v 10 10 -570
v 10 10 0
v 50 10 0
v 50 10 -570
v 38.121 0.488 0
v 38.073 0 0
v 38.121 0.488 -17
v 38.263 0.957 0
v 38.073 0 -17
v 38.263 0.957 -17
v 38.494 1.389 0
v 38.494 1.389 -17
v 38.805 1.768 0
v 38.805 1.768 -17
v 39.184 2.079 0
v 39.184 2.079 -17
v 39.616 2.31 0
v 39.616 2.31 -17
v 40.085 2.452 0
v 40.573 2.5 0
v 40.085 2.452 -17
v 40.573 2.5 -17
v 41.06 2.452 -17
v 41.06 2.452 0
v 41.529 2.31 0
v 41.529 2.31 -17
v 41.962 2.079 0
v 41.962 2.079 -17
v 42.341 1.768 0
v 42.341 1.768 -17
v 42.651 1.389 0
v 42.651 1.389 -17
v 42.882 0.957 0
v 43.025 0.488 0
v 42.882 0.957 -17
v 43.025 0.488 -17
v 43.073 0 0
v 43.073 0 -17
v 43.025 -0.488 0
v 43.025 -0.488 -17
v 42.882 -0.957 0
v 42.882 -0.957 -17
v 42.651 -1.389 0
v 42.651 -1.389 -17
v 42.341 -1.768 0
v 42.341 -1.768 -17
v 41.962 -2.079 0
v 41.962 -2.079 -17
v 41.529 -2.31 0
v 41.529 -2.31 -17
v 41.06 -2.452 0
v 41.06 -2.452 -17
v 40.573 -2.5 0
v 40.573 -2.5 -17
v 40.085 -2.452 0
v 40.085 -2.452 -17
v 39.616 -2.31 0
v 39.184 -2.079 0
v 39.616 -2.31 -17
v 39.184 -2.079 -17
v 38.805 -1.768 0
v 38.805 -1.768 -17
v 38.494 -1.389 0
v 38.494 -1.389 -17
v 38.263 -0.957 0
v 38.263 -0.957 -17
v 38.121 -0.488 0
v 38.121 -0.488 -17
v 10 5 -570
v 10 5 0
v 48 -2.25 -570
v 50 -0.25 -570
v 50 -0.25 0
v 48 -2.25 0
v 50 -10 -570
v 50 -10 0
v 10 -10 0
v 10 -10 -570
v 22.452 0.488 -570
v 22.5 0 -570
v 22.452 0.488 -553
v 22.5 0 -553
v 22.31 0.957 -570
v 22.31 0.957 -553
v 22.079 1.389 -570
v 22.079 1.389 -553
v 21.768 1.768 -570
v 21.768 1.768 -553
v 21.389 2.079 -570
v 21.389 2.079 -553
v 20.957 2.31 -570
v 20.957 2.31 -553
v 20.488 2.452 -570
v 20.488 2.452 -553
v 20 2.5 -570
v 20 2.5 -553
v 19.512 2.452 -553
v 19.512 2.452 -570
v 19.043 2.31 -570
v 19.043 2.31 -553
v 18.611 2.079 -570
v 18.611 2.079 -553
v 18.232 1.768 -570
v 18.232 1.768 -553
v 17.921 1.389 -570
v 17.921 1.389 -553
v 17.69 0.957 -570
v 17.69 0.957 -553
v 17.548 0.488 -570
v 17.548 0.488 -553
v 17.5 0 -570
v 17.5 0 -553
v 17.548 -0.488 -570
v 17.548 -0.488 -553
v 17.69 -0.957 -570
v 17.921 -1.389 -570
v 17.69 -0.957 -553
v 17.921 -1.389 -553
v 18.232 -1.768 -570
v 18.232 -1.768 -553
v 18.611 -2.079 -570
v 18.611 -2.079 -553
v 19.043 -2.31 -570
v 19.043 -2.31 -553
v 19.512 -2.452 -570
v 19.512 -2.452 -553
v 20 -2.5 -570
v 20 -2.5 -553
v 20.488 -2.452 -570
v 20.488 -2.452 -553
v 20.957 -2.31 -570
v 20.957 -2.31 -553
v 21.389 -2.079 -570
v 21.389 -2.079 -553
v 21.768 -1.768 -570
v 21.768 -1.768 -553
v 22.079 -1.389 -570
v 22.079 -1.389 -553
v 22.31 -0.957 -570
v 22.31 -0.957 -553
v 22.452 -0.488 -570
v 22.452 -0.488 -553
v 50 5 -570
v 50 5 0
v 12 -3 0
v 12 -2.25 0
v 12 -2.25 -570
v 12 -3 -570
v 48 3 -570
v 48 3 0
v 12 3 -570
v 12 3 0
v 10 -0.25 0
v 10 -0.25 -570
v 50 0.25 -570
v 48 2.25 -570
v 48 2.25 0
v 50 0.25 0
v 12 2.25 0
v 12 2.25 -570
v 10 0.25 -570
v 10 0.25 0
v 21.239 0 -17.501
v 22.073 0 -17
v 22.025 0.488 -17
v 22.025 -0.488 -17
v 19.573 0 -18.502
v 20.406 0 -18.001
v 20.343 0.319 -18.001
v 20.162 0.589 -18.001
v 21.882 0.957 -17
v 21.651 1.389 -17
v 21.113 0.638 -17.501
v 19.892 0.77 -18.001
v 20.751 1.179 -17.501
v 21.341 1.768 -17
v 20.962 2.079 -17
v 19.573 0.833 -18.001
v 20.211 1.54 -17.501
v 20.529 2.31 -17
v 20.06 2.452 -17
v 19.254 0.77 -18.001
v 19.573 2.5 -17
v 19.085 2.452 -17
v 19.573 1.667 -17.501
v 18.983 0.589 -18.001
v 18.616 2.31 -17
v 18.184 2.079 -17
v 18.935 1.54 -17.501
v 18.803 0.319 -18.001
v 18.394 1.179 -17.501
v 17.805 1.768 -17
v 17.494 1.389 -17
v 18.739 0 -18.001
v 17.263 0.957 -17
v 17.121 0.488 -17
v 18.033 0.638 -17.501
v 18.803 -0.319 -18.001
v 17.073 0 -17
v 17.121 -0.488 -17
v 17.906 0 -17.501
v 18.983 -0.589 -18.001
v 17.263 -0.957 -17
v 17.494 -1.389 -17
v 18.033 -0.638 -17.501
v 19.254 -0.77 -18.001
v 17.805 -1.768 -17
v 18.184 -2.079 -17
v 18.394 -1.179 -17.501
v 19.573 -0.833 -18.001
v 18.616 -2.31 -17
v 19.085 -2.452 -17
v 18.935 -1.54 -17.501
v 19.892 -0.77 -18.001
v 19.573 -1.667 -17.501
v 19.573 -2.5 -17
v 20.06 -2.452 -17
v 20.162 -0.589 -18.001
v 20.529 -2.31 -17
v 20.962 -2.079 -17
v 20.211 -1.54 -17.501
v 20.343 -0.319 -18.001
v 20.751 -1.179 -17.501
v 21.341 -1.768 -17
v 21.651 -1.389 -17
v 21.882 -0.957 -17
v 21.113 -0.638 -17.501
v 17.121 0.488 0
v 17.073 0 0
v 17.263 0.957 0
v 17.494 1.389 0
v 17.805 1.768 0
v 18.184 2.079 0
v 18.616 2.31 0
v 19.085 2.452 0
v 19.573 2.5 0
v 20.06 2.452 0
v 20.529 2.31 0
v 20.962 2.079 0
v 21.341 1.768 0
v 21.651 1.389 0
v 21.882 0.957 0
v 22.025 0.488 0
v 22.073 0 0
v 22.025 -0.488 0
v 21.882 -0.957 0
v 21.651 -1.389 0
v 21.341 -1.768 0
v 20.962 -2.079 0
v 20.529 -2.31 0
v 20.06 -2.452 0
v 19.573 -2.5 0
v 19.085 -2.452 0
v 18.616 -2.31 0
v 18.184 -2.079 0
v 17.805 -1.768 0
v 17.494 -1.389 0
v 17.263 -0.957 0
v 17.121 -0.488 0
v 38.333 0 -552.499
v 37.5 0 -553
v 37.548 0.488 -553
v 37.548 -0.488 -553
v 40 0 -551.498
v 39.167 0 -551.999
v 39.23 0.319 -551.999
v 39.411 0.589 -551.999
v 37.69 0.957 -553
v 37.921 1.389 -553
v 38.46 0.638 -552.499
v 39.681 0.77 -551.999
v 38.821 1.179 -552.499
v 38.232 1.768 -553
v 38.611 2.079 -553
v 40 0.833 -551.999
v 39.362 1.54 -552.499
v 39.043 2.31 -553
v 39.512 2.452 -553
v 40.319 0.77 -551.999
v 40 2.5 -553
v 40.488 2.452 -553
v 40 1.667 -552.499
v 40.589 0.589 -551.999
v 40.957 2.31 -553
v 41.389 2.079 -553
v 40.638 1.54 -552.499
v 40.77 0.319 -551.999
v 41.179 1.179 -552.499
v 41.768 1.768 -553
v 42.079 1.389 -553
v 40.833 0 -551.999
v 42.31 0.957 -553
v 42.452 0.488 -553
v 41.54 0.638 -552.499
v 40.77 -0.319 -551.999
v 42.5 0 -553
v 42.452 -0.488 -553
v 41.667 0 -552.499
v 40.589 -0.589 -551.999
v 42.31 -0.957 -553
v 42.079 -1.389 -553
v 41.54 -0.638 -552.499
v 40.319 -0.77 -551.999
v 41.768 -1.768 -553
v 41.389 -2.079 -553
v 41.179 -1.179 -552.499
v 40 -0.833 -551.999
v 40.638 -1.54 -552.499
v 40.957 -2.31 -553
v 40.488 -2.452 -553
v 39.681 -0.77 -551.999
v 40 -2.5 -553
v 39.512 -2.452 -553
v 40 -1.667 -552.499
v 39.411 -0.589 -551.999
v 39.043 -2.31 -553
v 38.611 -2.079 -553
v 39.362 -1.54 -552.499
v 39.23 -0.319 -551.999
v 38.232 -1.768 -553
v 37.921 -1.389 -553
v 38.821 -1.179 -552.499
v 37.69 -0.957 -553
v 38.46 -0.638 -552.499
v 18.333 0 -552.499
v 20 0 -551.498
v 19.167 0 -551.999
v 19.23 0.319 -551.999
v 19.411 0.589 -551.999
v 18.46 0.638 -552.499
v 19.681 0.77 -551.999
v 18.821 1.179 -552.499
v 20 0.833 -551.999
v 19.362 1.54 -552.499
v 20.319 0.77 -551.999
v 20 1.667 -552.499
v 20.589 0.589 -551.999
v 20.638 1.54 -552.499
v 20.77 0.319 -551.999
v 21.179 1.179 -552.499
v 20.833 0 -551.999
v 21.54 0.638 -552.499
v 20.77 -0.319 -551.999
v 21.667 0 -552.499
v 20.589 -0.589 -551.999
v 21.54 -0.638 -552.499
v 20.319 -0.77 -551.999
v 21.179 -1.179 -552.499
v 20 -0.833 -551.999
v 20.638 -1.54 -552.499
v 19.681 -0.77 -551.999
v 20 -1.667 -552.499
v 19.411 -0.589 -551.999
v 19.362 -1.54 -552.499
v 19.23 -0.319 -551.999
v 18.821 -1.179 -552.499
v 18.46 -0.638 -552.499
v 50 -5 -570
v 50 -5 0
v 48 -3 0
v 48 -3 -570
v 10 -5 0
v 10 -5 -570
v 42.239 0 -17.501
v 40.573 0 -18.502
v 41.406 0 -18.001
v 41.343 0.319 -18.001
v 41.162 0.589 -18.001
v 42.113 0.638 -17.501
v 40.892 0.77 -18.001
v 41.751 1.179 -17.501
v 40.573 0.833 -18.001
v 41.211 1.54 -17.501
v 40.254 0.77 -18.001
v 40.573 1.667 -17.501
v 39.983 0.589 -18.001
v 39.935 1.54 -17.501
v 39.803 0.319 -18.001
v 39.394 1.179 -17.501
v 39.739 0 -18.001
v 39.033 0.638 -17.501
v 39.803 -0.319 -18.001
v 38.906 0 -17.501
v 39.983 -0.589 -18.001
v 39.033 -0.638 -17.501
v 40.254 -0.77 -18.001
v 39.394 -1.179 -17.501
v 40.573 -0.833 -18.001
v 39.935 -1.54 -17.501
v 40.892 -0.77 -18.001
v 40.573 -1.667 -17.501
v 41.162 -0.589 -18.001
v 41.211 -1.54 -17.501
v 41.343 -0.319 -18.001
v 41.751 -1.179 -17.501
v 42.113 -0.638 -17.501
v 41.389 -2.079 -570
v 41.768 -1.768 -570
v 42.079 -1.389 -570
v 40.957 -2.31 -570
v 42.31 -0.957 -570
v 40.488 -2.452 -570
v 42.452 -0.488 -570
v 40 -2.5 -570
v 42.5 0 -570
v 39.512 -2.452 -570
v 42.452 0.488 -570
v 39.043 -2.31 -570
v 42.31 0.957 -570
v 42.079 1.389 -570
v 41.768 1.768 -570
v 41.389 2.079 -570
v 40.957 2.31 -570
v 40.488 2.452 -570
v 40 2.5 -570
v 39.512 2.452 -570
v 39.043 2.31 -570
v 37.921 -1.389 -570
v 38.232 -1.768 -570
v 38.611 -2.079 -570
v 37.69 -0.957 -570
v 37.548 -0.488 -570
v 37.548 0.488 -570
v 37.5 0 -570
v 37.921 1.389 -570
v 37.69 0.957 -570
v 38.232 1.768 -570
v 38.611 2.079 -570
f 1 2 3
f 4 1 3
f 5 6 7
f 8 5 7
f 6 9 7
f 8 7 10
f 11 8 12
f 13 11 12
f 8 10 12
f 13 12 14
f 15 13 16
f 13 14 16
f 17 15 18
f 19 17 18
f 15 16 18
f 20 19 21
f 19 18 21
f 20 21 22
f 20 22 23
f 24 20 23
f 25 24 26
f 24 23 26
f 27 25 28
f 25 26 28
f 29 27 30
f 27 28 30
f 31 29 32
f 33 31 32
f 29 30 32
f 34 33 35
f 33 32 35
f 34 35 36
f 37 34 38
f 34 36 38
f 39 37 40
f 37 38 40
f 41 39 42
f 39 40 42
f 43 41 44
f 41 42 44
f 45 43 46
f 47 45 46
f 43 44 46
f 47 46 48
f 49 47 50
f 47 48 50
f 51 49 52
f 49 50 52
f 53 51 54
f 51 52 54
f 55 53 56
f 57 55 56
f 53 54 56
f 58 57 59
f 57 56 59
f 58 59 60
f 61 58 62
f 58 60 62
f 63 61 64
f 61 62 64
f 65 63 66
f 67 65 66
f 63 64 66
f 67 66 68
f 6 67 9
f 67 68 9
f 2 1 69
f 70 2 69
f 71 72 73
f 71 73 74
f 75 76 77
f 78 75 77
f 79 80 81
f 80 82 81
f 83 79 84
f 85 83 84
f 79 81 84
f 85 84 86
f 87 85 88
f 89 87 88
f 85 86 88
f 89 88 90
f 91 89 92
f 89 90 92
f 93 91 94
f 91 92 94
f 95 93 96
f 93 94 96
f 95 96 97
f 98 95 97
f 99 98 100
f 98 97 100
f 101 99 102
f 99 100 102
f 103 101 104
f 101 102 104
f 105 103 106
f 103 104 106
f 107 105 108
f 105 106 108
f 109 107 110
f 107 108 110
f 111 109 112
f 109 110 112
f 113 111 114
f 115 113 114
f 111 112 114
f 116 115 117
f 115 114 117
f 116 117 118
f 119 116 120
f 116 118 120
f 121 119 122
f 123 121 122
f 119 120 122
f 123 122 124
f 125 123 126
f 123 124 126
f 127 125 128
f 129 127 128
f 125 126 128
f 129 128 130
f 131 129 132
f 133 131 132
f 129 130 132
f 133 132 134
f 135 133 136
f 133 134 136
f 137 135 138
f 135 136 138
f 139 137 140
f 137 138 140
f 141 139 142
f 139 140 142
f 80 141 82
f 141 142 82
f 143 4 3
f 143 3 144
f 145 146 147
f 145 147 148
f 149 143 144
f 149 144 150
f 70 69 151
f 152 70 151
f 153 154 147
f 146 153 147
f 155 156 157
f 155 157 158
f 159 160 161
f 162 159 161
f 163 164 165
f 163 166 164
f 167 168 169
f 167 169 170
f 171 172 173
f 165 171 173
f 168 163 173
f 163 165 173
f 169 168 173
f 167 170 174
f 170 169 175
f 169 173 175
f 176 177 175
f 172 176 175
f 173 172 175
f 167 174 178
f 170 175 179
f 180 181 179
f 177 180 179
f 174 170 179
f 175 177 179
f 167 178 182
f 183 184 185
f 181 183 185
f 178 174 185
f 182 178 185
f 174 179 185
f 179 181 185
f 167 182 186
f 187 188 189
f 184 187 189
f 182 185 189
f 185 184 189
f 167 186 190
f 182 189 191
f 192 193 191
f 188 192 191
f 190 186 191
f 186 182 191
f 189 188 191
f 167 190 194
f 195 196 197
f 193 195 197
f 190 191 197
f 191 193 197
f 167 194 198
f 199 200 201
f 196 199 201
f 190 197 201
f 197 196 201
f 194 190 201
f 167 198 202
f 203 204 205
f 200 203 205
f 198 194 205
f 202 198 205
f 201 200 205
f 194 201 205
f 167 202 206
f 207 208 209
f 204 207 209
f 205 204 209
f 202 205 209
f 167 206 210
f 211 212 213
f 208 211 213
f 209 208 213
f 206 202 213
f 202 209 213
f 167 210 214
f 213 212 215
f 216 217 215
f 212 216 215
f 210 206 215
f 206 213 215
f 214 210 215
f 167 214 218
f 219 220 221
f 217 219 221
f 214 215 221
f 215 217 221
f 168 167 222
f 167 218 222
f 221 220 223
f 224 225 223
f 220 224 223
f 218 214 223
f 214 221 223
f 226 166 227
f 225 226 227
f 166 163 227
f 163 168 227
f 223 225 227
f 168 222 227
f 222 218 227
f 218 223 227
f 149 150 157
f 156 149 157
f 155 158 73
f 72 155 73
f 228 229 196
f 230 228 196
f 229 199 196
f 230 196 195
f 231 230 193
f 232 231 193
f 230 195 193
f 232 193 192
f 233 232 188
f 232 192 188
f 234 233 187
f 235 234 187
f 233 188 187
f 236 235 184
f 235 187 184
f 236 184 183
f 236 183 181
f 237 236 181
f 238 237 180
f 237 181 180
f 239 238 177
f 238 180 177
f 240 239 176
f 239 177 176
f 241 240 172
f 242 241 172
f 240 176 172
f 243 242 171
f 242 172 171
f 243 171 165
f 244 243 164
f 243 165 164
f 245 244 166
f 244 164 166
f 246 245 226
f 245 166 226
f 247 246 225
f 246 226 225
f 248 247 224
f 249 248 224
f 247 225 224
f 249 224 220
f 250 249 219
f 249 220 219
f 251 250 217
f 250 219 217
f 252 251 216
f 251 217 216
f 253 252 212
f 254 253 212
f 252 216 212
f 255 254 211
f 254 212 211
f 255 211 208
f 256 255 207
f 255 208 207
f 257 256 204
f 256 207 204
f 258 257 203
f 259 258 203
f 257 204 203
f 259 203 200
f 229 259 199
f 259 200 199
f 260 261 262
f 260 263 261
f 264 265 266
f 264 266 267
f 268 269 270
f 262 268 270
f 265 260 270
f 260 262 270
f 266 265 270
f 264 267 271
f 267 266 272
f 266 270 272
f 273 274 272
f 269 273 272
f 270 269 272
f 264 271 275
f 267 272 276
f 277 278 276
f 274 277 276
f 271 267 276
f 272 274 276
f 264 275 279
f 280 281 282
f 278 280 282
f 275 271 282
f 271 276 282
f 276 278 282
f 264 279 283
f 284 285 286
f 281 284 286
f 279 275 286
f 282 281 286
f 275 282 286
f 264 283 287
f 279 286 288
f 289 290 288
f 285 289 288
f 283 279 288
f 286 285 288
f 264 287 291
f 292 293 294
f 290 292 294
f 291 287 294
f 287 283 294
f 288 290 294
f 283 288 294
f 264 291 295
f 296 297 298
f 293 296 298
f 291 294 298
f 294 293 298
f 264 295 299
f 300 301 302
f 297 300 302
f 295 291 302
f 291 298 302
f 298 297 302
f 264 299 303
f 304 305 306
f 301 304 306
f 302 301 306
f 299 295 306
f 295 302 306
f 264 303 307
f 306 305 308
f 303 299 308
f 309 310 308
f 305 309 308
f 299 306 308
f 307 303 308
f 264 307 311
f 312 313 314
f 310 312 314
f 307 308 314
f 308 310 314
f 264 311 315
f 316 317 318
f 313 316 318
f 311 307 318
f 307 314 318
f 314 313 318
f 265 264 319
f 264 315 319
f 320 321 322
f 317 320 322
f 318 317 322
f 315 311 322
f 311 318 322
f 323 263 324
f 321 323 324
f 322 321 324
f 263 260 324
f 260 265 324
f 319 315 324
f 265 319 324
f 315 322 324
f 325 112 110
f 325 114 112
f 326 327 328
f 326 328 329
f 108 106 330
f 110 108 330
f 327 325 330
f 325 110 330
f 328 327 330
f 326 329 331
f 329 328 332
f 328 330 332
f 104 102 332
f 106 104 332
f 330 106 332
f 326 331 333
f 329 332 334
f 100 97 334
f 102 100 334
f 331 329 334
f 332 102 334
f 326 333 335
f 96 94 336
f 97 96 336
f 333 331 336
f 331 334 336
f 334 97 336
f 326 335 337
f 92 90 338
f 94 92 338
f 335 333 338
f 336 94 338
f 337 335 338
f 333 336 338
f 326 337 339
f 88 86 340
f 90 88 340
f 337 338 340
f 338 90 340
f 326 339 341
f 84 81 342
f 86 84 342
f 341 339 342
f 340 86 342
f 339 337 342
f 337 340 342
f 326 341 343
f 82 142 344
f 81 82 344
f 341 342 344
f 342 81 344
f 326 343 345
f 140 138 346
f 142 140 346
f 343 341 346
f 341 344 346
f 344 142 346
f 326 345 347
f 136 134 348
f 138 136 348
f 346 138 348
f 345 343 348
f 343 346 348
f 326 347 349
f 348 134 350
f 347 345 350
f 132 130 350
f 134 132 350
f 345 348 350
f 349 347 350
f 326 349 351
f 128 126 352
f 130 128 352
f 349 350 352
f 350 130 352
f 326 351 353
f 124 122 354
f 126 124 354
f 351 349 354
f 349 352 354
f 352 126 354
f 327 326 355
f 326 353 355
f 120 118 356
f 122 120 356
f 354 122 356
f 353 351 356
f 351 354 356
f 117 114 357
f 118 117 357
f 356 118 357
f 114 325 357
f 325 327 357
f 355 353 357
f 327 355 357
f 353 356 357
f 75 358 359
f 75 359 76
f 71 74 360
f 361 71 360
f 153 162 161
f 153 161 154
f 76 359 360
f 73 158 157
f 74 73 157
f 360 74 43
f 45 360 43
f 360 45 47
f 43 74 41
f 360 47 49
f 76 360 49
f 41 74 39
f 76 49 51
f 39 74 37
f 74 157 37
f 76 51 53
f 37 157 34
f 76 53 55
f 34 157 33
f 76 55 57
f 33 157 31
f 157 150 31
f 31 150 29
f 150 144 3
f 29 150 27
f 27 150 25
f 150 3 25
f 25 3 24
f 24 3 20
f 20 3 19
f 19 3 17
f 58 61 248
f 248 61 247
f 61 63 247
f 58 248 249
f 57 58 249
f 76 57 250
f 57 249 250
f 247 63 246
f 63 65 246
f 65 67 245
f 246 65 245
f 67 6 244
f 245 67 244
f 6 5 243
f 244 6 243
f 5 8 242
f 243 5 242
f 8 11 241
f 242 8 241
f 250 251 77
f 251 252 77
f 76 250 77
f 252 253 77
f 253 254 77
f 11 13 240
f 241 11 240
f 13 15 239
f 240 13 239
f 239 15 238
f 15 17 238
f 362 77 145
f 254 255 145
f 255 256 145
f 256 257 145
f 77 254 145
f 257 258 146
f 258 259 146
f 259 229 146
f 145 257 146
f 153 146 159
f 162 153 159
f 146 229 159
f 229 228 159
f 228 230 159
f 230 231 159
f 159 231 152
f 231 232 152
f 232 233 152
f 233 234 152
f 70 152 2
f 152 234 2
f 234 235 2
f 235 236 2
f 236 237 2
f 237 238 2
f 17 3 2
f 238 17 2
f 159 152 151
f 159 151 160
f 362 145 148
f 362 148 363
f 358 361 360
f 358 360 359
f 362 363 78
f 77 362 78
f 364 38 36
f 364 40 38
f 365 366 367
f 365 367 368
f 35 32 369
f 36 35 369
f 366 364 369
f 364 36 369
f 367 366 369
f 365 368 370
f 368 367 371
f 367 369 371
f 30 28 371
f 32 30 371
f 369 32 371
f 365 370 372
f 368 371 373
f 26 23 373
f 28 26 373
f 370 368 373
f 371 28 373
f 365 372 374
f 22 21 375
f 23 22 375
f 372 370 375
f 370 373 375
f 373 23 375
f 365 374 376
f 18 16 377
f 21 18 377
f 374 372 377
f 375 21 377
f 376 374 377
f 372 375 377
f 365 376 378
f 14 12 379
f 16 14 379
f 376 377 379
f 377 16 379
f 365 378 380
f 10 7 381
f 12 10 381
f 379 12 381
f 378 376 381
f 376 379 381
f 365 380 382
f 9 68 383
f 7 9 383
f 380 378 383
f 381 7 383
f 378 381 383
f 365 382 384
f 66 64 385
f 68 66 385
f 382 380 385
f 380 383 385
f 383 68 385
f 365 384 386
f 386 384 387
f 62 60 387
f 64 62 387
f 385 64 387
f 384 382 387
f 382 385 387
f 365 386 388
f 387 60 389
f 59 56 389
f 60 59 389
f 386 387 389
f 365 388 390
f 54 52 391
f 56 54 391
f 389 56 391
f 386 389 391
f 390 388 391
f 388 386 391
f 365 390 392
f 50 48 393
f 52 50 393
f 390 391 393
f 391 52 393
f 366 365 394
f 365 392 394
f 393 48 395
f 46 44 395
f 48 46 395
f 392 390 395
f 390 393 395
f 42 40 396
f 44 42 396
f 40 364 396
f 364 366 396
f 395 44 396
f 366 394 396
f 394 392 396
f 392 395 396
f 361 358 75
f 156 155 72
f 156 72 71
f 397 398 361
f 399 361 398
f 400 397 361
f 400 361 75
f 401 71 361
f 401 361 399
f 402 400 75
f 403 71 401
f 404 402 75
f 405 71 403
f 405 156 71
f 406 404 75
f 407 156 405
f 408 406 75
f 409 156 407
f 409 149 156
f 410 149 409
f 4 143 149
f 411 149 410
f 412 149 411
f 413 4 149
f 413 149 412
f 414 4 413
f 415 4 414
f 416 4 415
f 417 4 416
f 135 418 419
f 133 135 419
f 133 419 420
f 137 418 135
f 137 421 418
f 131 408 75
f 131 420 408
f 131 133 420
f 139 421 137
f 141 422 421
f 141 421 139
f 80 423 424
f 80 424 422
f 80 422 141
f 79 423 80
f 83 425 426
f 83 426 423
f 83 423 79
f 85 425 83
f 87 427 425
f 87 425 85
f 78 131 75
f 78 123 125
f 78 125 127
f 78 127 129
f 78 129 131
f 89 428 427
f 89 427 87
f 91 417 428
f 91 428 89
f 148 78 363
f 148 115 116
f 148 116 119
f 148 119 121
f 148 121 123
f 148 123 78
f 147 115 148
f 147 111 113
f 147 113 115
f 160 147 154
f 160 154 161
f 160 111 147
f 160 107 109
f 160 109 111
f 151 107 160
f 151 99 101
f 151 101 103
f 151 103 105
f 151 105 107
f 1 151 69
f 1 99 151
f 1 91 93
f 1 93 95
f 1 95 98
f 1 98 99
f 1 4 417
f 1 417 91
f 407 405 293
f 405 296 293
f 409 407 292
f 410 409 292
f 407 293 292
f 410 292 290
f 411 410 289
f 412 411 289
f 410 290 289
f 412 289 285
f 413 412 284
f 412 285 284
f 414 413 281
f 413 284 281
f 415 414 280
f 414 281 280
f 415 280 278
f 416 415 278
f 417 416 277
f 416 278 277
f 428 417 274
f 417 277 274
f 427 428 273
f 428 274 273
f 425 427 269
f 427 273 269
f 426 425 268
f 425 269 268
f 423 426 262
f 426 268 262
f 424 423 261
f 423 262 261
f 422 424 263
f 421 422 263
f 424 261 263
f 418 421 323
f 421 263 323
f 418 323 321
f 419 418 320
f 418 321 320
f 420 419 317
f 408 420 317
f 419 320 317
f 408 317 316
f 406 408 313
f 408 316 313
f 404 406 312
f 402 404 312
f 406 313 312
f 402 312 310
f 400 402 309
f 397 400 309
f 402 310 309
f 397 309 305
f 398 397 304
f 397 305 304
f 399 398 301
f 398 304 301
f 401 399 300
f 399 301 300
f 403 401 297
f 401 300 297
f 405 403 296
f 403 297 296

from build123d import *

# Parameters (mm, degrees)
EXTRUDE_1_DEPTH        = 570
HOLE_WIZARD_M6_1_D     = 5
HOLE_WIZARD_M6_1_DEPTH = 17
HOLE_WIZARD_M6_1_TIP   = 1.502151548
HOLE_WIZARD_M6_2_D     = 5
HOLE_WIZARD_M6_2_DEPTH = 17
HOLE_WIZARD_M6_2_TIP   = 1.502151548


with BuildPart() as part:
    # 草图1 → 凸台-拉伸1 (new body)
    with BuildSketch(Plane.XY):
        Polygon((10, 0.25), (10, -0.25), (12, -2.25), (12, -3), (10, -5), (10, -10), (30, -10), (30, 10), (10, 10), (10, 5), (12, 3), (12, 2.25), align=None)
    extrude_1 = extrude(amount=-EXTRUDE_1_DEPTH)

    # 镜向1: 凸台-拉伸1 across plane
    add(extrude_1.mirror(Plane(origin=(30, 0, 0), x_dir=(0, 0, 1), z_dir=(1, 0, 0))))

    # M6 螺纹孔1
    with Locations(Plane(origin=(0, 0, -570), x_dir=(-1, 0, 0), z_dir=(0, 0, -1))):
        with Locations((-40, 0), (-20, 0)):
            Hole(HOLE_WIZARD_M6_1_D / 2, depth=HOLE_WIZARD_M6_1_DEPTH)
            with Locations((0, 0, -(HOLE_WIZARD_M6_1_DEPTH + HOLE_WIZARD_M6_1_TIP / 2))):  # 118° drill point
                Cone(0, HOLE_WIZARD_M6_1_D / 2, HOLE_WIZARD_M6_1_TIP, mode=Mode.SUBTRACT)

    # M6 螺纹孔2
    with Locations(Plane.XY):
        with Locations((19.572746266, 0), (40.572746266, 0)):
            Hole(HOLE_WIZARD_M6_2_D / 2, depth=HOLE_WIZARD_M6_2_DEPTH)
            with Locations((0, 0, -(HOLE_WIZARD_M6_2_DEPTH + HOLE_WIZARD_M6_2_TIP / 2))):  # 118° drill point
                Cone(0, HOLE_WIZARD_M6_2_D / 2, HOLE_WIZARD_M6_2_TIP, mode=Mode.SUBTRACT)


solid = part.part
